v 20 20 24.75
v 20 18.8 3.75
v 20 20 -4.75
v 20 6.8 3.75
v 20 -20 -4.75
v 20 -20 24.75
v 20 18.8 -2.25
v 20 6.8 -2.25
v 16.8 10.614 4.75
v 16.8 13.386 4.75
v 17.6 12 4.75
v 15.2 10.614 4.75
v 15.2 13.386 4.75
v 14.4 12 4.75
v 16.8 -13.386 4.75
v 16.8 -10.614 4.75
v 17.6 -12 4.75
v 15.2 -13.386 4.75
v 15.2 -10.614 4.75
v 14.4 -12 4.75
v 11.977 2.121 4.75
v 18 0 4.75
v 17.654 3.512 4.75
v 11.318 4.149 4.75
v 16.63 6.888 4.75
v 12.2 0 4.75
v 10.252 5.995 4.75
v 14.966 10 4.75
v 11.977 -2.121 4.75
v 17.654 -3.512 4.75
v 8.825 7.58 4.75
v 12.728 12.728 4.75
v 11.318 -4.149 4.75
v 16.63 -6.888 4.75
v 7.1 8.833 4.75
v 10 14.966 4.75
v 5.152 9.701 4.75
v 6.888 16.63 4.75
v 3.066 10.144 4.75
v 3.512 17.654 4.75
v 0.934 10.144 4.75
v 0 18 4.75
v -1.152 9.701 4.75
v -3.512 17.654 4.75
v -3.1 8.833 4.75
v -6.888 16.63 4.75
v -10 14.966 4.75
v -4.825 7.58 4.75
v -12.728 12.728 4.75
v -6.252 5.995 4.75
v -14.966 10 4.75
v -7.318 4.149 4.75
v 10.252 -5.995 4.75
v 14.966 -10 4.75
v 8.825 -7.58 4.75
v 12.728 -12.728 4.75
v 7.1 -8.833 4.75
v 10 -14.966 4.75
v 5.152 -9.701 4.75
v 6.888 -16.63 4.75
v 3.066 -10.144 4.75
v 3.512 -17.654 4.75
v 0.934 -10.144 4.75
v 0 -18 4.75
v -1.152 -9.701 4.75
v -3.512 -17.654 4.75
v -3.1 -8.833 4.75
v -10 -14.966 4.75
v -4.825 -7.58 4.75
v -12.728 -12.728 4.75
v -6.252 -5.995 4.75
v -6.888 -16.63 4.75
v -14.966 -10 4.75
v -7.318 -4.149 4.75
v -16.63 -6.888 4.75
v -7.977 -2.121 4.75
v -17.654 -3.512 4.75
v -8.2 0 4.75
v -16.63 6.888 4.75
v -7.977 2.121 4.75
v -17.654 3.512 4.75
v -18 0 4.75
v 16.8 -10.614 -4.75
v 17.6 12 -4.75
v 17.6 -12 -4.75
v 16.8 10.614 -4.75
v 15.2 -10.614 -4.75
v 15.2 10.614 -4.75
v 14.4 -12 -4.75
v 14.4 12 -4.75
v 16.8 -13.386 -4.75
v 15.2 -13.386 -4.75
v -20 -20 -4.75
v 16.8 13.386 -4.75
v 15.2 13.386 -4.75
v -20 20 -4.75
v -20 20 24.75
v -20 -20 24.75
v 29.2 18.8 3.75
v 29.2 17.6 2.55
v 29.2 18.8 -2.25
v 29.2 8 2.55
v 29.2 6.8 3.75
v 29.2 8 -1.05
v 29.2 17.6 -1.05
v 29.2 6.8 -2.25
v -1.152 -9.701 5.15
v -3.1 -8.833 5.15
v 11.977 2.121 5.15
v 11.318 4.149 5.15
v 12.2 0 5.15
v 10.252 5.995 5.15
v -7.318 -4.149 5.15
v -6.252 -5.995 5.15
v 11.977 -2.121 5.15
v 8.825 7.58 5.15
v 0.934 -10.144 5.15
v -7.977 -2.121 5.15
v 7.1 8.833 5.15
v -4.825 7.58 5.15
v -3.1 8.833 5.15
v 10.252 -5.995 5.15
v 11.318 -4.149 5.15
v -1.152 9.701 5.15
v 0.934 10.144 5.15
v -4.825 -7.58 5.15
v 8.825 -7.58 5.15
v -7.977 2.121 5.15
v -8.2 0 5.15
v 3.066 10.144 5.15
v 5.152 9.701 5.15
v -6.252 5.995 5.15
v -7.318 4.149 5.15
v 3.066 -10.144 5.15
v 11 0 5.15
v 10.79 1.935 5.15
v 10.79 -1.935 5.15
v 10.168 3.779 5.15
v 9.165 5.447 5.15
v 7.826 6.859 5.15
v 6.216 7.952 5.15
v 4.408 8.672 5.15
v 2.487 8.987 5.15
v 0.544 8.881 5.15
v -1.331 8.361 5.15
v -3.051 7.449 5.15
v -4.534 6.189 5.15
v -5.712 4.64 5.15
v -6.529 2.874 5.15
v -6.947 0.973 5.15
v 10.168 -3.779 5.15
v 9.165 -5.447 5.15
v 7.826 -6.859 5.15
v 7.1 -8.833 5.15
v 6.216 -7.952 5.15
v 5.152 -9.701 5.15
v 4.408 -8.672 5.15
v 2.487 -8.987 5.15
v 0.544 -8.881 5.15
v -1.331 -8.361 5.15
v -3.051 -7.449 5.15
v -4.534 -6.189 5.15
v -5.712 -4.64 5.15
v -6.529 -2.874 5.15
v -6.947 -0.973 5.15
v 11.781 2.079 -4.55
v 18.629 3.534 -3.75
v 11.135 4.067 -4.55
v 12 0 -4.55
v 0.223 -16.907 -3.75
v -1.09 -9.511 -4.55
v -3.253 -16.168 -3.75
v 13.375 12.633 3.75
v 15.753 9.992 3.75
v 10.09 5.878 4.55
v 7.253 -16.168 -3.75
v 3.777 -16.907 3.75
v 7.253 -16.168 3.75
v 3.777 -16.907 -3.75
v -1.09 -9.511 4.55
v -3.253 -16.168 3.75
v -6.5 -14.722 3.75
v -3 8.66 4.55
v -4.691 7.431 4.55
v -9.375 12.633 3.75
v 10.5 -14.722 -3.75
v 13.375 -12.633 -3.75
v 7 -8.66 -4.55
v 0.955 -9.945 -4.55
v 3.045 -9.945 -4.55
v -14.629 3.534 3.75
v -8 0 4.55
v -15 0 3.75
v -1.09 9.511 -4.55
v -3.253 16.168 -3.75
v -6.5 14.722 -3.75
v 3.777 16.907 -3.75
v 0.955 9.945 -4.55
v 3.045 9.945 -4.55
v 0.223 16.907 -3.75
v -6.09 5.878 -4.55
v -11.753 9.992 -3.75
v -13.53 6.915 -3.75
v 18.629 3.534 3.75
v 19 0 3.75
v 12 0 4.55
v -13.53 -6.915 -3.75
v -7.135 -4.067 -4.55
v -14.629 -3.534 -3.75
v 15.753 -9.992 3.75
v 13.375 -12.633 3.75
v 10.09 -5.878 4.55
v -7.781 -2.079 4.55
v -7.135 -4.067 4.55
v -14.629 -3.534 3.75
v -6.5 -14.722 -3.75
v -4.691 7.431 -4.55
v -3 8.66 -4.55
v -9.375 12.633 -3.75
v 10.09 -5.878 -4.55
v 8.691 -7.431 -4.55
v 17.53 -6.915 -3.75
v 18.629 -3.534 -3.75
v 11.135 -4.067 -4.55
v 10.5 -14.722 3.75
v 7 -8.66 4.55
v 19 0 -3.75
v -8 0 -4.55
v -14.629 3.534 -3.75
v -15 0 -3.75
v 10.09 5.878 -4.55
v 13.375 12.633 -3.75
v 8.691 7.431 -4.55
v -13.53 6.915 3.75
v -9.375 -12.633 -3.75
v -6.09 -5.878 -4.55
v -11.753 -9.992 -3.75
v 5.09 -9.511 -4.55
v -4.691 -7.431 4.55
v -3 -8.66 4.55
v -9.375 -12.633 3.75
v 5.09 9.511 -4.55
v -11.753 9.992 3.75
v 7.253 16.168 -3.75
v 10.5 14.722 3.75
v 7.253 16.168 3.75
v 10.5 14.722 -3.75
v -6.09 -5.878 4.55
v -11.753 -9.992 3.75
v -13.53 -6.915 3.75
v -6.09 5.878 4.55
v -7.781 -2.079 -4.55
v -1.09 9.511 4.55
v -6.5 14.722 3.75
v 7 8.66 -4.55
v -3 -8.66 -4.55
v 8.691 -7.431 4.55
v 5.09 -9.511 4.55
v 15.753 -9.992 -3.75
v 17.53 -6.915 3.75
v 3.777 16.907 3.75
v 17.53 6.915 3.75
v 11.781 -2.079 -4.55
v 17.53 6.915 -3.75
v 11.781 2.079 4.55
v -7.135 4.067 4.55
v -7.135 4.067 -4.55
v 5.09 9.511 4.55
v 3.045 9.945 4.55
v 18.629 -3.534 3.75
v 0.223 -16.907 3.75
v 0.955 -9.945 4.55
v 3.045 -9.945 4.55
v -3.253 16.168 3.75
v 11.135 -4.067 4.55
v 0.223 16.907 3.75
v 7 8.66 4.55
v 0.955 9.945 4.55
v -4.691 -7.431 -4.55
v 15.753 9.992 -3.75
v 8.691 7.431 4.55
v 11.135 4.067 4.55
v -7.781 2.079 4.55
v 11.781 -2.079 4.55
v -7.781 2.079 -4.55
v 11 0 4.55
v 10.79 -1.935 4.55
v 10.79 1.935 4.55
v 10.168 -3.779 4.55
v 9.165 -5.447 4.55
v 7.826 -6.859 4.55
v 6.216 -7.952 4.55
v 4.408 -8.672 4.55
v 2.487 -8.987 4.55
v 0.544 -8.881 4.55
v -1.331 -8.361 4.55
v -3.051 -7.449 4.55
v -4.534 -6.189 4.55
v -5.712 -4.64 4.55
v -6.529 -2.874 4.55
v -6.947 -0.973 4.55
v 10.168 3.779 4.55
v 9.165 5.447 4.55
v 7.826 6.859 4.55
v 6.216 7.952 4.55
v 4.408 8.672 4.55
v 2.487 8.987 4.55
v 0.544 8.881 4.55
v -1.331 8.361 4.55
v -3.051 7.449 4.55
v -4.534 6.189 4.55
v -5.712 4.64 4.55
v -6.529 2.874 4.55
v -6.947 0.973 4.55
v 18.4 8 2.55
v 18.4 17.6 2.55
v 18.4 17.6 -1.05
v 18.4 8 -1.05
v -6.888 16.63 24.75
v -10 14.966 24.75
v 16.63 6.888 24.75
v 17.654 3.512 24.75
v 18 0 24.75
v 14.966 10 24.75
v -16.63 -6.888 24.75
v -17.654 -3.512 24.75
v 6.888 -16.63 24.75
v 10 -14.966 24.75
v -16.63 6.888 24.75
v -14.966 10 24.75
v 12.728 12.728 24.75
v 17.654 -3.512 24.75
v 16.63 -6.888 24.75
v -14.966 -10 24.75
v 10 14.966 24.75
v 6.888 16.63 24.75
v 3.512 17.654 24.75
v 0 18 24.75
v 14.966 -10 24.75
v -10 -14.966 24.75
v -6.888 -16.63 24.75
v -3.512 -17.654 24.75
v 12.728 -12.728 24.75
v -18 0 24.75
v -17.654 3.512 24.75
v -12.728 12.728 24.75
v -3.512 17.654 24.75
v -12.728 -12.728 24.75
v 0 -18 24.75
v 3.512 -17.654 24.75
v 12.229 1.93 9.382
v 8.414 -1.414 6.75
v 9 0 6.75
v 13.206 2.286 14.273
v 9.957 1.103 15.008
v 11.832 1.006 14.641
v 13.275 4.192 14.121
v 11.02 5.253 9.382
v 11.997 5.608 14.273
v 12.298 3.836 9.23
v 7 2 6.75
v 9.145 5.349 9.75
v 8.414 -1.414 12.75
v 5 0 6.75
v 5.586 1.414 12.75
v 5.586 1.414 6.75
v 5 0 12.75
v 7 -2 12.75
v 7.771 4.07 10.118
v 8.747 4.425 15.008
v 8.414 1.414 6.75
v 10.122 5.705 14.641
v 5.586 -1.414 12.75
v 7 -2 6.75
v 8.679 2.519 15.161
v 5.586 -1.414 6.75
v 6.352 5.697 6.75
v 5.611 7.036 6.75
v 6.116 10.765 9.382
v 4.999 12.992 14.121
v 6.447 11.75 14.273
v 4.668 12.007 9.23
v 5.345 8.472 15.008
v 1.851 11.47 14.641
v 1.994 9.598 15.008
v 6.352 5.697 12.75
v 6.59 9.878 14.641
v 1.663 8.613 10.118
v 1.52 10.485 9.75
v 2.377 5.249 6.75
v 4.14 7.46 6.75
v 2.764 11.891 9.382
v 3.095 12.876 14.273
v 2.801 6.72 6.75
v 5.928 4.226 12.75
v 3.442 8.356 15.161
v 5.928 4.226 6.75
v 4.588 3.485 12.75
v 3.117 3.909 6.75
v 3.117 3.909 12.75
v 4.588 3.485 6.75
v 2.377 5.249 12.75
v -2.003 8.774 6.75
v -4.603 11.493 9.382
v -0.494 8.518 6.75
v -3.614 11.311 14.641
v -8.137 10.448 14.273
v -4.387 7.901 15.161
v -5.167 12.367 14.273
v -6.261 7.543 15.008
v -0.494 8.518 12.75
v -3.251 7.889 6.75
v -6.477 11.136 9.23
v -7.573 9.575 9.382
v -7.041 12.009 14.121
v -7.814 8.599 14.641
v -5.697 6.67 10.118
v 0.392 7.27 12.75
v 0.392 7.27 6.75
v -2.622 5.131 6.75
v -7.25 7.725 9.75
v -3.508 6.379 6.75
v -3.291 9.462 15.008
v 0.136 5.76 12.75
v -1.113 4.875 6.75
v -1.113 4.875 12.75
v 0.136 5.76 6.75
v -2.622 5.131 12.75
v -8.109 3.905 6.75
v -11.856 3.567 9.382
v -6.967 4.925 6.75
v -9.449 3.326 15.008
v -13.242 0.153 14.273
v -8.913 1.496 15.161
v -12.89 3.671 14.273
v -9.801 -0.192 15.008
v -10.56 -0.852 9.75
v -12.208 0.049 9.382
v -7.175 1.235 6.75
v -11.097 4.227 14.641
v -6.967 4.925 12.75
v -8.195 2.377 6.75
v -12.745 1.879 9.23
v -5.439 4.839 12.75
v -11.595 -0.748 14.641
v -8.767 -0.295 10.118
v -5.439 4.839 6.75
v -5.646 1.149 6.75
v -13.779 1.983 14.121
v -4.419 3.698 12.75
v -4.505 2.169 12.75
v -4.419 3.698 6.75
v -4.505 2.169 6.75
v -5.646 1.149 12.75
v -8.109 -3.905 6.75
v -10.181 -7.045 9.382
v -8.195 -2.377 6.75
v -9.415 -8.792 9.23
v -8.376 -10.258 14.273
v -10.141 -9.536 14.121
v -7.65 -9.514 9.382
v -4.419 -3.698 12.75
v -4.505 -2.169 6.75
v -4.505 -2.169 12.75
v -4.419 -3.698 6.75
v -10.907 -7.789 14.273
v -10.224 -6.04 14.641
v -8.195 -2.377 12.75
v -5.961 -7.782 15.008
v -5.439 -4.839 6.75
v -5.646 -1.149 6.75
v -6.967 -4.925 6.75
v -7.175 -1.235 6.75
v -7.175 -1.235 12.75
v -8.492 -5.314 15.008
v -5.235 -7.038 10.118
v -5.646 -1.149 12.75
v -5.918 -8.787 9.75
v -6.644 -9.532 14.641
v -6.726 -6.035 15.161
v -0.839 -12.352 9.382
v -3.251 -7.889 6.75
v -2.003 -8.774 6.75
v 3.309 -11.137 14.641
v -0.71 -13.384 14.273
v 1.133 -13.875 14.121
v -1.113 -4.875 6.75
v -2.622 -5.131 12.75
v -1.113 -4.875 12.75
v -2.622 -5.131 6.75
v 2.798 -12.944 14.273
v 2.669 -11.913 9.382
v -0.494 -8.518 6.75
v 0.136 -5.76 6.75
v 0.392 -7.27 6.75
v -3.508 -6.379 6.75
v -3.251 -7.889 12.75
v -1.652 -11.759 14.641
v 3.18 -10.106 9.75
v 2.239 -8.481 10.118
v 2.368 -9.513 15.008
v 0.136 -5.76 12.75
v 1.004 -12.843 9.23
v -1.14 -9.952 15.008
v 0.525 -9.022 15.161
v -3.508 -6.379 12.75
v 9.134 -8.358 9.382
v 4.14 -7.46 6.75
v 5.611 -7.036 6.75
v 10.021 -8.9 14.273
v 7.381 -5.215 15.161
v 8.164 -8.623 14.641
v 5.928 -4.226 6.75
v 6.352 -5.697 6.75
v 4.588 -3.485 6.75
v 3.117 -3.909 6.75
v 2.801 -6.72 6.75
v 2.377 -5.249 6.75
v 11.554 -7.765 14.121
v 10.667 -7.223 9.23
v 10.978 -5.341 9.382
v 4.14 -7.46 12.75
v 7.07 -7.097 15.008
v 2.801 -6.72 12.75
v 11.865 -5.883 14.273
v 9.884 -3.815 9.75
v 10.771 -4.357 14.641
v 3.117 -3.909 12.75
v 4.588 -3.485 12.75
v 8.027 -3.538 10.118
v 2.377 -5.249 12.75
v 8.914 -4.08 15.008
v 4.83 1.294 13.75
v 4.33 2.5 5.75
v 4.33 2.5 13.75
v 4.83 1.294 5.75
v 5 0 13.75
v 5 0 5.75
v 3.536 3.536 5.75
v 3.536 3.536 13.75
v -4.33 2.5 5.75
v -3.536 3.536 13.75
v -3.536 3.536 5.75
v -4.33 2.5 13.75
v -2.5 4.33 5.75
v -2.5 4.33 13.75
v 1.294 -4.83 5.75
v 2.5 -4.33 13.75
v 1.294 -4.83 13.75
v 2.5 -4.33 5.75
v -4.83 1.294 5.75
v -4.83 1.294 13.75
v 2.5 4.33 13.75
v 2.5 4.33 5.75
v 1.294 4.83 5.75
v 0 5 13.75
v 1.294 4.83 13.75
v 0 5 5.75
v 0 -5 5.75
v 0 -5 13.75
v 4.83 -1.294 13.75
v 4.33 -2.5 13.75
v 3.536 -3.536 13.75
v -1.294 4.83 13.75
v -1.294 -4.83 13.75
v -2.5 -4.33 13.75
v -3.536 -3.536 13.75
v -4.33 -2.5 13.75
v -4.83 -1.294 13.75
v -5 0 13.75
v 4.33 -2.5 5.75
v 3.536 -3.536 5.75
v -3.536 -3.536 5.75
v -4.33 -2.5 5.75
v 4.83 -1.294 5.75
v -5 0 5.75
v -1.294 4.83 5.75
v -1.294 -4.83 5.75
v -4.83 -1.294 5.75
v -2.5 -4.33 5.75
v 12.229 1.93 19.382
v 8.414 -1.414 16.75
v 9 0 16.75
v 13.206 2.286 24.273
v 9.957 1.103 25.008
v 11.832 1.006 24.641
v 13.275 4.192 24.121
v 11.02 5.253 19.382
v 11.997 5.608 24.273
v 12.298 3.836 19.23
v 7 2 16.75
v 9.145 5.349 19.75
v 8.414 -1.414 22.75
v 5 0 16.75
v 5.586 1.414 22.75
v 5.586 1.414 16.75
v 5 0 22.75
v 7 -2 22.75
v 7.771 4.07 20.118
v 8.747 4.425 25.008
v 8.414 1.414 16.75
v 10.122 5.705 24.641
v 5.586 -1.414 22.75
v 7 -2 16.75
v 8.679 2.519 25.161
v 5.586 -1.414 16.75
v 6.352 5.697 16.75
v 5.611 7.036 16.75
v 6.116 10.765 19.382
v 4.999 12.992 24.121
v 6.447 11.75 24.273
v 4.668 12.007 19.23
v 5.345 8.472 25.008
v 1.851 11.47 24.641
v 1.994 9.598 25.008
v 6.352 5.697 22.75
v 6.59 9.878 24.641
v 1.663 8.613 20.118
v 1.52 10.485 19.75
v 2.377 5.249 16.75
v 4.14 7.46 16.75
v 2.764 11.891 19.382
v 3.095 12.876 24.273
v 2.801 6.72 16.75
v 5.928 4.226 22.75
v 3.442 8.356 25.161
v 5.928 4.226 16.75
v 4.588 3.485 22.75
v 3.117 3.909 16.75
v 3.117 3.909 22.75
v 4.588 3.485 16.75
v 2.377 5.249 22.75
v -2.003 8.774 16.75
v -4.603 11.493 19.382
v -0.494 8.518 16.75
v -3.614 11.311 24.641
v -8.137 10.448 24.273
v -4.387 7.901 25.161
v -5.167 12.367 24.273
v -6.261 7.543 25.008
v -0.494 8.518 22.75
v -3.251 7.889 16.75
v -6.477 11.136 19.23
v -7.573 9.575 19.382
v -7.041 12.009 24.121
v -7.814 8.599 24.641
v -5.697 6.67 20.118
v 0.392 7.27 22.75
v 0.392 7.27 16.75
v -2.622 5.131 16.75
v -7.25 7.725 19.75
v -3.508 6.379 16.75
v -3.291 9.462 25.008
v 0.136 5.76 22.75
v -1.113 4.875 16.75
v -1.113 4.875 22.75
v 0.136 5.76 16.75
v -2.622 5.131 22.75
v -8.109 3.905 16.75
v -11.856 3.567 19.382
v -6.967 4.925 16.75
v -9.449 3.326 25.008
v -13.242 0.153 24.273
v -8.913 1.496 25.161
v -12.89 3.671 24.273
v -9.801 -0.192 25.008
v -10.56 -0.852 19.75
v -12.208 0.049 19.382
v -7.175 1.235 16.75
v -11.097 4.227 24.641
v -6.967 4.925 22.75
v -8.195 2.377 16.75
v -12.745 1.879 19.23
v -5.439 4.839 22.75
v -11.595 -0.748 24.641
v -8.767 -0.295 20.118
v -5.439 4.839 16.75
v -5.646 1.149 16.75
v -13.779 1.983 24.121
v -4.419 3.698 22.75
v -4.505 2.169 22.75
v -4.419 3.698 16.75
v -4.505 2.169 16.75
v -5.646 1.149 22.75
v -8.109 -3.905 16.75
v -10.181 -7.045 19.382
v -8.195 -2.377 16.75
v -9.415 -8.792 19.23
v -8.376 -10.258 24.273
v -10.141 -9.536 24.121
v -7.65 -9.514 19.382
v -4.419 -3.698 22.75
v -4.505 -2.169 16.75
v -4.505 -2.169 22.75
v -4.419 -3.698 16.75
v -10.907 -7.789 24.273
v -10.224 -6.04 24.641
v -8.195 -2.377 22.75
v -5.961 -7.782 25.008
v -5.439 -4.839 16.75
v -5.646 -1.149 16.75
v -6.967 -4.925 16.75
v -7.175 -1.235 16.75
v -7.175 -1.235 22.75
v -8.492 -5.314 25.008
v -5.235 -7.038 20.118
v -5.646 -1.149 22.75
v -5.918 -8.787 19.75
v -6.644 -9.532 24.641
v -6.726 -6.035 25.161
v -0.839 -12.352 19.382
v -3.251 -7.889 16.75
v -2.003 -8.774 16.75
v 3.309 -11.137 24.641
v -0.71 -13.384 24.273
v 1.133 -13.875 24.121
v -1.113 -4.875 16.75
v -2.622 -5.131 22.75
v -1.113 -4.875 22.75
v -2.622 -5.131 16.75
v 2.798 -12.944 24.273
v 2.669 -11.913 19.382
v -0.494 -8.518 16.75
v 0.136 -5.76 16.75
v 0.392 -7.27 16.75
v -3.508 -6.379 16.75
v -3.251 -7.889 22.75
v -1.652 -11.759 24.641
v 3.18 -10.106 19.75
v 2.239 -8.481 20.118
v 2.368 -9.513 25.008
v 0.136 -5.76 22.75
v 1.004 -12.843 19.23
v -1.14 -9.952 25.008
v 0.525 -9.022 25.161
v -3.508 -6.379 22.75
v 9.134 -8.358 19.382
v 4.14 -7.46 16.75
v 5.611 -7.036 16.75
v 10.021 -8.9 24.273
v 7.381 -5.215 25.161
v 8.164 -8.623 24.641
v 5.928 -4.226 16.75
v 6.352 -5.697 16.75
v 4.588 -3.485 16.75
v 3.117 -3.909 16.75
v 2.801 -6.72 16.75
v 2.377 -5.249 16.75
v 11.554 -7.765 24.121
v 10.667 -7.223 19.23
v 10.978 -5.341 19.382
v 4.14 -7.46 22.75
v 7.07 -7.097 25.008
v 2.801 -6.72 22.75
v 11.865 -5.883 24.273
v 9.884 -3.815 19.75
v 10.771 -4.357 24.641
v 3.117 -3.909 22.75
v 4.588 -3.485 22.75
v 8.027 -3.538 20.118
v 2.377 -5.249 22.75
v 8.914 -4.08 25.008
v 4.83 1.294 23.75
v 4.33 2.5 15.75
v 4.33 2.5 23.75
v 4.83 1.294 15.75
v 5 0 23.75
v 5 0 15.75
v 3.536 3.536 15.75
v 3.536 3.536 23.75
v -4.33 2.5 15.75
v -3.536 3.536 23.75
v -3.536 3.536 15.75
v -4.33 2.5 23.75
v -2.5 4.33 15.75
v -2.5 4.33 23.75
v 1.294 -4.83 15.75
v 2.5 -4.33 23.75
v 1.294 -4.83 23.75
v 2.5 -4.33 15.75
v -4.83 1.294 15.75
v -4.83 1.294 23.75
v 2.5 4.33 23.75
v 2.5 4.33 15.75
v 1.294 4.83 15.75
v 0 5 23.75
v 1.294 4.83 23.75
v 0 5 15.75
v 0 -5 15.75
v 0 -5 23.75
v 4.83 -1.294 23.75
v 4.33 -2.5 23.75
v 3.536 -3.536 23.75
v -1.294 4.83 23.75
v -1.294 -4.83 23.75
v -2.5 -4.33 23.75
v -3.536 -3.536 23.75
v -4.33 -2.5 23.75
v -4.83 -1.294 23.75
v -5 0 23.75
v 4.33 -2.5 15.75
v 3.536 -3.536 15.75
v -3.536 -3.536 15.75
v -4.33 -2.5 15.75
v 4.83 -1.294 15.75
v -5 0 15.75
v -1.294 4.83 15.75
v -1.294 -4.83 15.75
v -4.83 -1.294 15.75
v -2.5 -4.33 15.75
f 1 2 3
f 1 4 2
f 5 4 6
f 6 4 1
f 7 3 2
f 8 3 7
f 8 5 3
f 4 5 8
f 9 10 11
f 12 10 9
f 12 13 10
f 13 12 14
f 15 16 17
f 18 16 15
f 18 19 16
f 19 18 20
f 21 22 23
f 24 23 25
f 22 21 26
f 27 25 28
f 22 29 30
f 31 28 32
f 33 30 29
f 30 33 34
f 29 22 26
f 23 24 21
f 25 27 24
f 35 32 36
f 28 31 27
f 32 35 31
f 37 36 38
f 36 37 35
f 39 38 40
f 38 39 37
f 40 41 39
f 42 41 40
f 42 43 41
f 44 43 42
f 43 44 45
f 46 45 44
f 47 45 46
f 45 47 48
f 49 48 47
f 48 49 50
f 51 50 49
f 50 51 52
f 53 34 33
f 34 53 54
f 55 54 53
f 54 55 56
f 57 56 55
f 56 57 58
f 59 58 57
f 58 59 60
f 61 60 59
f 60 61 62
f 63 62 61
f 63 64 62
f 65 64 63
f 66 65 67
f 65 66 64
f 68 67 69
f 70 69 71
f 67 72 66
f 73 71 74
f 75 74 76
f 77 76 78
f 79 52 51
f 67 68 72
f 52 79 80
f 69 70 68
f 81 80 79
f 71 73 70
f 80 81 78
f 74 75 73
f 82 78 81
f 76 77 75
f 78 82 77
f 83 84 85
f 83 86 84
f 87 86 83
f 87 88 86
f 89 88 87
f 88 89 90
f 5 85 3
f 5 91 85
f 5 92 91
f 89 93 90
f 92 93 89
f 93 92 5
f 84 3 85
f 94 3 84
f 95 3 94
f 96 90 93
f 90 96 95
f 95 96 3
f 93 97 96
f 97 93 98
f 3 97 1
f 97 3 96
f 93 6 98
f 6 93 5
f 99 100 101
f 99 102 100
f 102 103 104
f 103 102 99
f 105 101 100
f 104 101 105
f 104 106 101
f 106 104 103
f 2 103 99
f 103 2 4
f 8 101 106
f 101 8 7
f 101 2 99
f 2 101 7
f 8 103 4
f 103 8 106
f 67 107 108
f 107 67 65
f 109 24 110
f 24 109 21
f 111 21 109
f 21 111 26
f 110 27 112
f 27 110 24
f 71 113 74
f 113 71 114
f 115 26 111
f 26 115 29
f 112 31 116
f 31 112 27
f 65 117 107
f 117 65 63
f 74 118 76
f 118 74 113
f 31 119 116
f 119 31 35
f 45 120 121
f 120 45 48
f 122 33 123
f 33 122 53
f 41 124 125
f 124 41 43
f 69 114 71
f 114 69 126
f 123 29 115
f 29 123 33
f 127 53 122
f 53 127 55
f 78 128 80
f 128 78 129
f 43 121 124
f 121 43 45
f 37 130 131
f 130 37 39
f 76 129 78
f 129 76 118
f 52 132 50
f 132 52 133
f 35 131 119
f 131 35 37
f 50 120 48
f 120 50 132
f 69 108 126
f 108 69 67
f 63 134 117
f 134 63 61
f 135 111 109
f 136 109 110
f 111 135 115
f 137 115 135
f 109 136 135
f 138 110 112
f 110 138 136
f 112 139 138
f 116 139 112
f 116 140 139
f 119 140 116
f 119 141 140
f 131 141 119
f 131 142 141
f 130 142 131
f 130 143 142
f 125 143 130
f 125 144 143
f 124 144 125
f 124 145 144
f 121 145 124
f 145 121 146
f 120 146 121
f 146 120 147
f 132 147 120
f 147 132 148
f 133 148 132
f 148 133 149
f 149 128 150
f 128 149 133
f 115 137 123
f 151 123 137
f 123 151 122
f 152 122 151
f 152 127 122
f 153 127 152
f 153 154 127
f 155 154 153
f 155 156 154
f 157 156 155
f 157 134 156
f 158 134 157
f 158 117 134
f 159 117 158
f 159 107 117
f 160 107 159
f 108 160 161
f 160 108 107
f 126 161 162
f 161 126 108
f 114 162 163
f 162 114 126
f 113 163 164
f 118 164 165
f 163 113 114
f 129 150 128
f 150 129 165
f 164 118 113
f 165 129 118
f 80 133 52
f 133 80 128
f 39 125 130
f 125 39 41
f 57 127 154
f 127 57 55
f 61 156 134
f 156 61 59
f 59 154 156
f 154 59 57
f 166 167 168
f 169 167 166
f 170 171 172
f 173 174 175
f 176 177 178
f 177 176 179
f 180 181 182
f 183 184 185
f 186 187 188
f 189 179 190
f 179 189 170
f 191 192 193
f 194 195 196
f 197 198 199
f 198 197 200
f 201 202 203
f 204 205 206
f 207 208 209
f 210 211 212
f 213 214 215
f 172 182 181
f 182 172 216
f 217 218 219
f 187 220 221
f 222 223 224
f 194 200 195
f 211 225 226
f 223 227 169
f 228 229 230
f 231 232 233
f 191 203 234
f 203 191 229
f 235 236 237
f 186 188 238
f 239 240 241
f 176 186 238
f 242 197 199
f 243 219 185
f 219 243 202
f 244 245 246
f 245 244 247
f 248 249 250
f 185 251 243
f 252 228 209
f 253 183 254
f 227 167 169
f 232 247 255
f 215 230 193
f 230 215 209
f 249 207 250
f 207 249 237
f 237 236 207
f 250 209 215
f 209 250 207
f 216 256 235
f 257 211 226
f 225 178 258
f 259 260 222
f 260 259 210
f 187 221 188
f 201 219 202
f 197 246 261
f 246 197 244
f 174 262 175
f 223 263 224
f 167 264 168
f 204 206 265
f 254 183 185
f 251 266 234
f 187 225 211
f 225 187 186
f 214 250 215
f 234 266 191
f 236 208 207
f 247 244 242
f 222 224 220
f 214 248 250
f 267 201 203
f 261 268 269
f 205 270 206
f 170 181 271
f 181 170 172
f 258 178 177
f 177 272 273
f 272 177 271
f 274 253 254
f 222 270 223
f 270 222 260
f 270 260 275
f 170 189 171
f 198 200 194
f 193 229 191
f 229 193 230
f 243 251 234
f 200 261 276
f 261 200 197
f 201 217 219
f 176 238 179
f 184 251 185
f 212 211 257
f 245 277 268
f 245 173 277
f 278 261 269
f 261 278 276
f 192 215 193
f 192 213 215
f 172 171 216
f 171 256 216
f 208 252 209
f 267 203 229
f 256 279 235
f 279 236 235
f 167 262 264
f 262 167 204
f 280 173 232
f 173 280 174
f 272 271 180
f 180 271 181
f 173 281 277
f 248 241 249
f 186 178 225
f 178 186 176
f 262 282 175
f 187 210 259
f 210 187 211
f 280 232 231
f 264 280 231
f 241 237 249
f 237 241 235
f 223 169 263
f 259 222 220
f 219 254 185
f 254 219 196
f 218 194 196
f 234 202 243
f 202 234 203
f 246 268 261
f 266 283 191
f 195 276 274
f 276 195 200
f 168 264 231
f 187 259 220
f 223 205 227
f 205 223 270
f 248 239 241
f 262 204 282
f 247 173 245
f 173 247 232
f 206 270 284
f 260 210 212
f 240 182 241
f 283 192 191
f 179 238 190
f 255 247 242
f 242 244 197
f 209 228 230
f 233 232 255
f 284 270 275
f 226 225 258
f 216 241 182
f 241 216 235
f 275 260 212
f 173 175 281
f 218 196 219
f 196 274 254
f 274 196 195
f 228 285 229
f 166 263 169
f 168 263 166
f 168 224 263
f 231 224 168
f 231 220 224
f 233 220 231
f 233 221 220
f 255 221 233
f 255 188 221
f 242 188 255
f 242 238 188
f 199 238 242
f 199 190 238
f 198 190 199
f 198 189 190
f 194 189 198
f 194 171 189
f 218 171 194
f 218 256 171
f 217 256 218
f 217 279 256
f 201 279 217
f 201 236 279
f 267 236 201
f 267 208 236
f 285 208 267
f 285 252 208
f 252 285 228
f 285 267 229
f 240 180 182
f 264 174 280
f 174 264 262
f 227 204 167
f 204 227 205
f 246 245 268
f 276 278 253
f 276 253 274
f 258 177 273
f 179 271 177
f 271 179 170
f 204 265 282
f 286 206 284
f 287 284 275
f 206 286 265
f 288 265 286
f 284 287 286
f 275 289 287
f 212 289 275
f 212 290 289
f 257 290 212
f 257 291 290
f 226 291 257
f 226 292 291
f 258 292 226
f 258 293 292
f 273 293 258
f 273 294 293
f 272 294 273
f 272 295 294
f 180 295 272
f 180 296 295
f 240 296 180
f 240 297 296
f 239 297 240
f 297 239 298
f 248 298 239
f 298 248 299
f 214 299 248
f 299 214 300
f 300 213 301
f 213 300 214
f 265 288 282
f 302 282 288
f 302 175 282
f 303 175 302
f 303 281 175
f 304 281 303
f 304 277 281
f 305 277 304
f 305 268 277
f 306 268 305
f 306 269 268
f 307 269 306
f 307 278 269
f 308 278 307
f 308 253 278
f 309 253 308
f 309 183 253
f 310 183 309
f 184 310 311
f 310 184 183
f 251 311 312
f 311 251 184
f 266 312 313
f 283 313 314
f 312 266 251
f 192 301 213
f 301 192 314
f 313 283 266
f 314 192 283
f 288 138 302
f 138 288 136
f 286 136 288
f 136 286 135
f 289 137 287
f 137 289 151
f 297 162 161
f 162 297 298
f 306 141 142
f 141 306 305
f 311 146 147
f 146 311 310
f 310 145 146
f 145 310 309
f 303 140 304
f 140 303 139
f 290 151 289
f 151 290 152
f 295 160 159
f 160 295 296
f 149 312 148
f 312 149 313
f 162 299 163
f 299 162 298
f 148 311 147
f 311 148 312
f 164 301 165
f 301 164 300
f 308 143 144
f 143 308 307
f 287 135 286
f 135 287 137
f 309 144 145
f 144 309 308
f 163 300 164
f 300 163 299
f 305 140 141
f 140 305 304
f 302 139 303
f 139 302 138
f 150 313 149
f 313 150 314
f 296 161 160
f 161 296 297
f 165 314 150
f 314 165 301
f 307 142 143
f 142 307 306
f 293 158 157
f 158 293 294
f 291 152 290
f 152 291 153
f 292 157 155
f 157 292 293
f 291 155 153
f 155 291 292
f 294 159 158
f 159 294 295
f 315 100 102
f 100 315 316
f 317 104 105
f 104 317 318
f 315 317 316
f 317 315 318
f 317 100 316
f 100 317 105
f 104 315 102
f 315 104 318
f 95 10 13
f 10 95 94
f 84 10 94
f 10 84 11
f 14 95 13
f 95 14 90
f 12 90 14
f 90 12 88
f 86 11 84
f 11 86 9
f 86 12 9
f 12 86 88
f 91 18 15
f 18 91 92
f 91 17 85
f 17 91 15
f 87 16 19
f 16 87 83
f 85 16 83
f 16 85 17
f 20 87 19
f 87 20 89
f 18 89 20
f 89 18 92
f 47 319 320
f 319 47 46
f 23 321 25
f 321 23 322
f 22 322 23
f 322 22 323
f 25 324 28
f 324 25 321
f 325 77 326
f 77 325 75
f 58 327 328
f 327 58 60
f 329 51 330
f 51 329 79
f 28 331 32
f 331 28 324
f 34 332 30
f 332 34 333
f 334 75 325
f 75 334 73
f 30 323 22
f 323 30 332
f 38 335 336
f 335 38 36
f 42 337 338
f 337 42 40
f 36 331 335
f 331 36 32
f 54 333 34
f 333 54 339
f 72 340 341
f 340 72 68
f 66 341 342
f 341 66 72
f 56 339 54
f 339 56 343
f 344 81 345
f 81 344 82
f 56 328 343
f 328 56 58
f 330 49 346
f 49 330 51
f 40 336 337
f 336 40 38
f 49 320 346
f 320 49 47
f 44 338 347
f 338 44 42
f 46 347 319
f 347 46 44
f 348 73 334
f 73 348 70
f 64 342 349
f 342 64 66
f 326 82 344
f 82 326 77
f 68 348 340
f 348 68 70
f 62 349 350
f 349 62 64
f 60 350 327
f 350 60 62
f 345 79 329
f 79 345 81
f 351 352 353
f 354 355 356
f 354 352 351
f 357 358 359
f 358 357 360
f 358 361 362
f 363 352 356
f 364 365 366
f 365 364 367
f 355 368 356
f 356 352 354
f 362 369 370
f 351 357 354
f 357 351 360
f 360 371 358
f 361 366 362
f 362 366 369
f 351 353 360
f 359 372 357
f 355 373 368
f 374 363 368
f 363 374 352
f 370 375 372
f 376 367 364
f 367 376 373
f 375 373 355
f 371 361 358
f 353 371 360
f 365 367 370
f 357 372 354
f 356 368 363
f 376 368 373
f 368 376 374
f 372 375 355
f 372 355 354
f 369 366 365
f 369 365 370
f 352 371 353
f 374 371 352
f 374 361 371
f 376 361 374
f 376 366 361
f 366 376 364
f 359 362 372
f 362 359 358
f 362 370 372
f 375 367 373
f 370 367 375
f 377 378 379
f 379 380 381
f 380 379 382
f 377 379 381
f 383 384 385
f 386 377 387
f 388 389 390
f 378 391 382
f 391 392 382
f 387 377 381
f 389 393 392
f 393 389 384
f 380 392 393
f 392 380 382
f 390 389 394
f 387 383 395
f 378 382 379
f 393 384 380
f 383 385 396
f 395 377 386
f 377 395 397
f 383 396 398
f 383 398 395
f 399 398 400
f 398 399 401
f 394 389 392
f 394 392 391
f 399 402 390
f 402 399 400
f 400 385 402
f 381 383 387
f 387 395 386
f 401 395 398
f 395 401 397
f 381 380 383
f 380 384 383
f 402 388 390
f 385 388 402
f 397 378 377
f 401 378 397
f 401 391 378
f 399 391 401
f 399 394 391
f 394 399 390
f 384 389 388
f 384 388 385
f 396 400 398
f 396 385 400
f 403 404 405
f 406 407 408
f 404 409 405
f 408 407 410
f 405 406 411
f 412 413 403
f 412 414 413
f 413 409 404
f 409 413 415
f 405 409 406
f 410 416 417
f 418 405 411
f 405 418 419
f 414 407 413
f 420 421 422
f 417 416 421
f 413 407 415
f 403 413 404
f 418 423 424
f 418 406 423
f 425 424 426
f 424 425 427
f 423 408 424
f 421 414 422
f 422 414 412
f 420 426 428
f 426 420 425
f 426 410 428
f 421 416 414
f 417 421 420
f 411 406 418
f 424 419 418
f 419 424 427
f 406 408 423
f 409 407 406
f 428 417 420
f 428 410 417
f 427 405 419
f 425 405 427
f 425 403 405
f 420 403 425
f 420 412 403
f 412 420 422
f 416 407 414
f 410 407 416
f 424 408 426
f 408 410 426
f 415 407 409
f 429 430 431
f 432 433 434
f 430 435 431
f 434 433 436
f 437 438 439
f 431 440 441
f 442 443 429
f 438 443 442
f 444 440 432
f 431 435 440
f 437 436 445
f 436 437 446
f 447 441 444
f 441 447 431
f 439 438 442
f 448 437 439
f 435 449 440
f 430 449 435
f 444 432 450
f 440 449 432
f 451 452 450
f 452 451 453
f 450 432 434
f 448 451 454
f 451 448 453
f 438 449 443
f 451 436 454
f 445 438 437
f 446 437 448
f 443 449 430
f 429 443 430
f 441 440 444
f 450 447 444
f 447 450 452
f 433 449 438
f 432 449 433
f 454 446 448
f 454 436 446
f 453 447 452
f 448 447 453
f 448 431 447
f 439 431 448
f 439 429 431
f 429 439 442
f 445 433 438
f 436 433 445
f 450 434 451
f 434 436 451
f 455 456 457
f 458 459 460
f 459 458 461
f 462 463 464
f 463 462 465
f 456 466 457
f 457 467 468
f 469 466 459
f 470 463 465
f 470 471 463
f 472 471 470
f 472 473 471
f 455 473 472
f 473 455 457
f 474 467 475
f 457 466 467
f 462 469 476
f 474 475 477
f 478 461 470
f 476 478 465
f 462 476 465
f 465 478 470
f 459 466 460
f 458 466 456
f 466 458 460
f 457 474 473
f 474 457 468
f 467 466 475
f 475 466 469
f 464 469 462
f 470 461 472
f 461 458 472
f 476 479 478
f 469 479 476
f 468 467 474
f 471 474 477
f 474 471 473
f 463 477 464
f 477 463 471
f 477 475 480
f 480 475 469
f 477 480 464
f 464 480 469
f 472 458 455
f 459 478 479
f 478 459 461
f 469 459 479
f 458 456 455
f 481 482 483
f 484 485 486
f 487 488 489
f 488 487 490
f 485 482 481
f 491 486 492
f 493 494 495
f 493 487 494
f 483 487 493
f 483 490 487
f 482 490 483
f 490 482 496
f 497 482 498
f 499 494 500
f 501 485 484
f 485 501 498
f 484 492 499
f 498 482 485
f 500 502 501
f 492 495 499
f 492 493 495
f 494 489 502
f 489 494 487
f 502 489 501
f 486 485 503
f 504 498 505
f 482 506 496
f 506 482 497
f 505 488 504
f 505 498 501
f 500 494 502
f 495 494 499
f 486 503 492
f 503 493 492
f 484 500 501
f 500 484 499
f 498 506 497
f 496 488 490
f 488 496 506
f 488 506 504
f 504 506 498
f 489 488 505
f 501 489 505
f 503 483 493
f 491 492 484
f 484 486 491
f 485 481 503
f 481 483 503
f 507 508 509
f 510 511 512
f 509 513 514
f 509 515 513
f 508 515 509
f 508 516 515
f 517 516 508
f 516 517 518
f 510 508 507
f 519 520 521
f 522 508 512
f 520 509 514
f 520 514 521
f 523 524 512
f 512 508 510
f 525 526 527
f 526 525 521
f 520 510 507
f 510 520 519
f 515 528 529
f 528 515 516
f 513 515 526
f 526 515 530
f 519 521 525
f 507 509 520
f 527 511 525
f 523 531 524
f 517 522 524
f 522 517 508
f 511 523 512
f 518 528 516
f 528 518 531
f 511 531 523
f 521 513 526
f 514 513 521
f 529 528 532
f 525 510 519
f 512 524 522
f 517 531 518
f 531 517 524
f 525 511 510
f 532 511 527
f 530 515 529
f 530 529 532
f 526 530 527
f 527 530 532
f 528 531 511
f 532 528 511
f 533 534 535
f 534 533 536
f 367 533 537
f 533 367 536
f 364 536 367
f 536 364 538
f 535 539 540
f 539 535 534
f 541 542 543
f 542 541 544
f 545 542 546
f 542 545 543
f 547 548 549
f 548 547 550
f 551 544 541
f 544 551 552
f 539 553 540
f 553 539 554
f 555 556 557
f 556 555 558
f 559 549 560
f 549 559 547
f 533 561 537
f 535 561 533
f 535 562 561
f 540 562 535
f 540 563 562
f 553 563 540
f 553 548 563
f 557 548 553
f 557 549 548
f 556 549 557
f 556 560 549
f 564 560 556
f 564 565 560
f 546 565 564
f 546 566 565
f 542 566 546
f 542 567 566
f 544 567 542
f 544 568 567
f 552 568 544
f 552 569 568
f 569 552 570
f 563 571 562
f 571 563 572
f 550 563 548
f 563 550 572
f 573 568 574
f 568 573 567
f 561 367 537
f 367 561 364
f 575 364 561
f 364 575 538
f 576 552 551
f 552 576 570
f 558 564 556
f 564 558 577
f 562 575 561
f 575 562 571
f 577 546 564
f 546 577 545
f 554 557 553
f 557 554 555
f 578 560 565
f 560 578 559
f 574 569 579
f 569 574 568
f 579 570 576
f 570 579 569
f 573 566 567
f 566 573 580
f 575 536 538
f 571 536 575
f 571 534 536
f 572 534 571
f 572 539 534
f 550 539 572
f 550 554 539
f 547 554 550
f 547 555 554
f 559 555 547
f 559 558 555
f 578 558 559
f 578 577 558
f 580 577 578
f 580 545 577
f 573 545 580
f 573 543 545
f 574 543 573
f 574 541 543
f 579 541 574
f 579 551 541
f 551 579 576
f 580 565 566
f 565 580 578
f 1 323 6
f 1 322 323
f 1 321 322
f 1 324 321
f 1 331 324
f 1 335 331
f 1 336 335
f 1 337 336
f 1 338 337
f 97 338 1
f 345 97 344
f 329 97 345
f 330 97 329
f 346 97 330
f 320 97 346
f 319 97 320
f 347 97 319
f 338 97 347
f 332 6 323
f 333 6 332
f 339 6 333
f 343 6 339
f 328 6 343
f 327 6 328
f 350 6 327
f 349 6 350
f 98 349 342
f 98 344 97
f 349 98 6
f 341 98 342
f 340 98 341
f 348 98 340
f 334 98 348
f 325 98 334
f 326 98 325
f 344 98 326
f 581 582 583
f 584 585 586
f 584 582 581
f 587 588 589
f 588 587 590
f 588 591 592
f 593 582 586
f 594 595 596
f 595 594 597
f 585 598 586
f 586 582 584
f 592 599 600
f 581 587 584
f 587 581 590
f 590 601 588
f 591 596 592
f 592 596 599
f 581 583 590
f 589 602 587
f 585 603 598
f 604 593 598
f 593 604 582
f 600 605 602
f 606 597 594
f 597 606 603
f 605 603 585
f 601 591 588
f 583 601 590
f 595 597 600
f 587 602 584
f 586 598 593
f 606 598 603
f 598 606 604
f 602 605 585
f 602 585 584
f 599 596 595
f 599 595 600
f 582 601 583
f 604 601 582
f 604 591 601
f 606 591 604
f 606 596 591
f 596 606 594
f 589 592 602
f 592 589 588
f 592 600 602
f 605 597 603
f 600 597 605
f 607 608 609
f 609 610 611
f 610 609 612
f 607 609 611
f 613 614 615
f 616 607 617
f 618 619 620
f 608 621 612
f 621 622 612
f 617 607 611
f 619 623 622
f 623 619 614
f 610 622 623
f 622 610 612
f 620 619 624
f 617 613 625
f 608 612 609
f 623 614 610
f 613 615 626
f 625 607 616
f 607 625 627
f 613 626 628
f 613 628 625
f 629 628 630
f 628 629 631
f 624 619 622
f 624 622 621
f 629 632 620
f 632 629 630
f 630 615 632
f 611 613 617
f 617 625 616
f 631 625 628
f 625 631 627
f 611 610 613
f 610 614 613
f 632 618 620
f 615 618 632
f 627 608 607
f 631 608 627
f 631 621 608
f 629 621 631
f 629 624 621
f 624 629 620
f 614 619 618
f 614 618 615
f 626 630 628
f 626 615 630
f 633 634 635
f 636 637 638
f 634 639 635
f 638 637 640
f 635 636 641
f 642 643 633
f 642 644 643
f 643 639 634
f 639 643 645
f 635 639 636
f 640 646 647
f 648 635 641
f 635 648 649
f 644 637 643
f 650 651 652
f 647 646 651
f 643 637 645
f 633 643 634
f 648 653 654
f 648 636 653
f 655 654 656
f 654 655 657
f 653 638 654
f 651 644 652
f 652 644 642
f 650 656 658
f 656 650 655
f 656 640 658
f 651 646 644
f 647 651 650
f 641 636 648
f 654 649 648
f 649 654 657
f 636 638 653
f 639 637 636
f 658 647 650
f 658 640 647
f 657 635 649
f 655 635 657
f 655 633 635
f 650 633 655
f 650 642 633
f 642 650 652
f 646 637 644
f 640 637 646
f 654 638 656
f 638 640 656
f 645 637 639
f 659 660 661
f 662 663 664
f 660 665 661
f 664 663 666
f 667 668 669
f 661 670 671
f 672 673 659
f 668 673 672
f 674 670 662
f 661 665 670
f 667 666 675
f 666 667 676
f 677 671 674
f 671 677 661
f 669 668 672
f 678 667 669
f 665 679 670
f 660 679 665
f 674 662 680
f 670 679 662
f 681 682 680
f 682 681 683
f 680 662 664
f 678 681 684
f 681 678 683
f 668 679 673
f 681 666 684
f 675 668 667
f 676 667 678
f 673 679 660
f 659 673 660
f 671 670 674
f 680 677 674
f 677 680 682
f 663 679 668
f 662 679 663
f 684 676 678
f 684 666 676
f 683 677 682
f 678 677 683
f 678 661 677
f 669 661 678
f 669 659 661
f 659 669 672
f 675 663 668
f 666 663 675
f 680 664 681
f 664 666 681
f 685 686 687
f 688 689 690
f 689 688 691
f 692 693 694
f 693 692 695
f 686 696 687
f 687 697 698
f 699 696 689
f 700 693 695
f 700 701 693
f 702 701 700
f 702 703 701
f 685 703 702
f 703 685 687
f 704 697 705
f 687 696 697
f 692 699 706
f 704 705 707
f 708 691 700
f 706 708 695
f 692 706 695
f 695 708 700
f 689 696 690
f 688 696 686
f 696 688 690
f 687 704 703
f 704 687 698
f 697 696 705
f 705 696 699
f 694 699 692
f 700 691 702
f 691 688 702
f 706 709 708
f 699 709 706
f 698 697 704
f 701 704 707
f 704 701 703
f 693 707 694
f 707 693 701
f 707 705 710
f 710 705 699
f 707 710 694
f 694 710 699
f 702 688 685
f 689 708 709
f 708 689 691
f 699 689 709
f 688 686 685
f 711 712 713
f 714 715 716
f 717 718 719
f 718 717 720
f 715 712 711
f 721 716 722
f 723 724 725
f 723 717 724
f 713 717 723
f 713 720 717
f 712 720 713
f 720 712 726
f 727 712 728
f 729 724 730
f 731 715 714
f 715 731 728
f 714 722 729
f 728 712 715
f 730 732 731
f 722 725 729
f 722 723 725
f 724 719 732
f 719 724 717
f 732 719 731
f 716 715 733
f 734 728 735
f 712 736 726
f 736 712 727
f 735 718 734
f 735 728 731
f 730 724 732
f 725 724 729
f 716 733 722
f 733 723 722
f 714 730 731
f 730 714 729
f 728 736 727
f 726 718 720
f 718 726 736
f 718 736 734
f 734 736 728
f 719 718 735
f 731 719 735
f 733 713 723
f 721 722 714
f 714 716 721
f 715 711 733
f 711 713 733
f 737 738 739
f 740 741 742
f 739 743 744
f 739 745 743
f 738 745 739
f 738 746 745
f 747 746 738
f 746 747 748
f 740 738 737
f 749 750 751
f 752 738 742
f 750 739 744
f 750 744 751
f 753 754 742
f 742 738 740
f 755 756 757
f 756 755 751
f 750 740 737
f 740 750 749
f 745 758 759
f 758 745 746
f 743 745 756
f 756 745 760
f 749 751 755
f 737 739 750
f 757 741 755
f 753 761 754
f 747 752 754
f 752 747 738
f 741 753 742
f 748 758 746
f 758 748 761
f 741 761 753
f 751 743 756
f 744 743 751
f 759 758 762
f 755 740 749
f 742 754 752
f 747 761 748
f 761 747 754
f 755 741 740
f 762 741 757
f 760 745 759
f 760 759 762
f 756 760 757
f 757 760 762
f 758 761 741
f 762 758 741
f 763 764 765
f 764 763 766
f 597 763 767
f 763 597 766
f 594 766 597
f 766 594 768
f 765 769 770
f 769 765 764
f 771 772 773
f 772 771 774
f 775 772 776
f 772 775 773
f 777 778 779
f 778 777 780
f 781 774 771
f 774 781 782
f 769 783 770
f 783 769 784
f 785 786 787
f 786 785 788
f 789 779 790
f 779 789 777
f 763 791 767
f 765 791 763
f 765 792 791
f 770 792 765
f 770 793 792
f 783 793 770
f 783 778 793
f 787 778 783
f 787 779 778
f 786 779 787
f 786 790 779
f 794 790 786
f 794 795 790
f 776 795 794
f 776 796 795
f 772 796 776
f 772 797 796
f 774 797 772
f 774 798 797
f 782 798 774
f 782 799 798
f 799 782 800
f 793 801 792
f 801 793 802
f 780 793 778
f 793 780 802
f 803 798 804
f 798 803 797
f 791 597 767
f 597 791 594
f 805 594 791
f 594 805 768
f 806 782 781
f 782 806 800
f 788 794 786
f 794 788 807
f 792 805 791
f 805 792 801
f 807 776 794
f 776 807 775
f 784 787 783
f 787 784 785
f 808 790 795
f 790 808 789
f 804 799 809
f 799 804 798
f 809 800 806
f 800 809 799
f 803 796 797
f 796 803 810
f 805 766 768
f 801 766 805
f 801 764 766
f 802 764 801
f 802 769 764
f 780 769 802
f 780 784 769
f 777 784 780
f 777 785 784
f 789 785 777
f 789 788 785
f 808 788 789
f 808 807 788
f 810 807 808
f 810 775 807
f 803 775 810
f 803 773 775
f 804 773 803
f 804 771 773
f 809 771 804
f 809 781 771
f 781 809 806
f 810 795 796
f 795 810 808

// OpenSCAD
// Parameters
overall_width_mm = 40; //[20:80:0.5]
overall_length_mm = 40; //[20:80:0.5]
overall_depth_mm = 9.5; //[5:20:0.1]
wall_thickness_mm = 1.2; //[0.8:2.4:0.1]
top_plate_thickness_mm = 1.0; //[0.6:2.0:0.1]
base_plate_thickness_mm = 1.0; //[0.6:2.0:0.1]
clearance_overlap_mm = 0.8; //[0.5:2.0:0.1]
inlet_bore_d_mm = 18; //[10:28:0.5]
inlet_lip_height_mm = 1.2; //[0.6:3.0:0.1]
outlet_width_mm = 12; //[8:20:0.5]
outlet_height_mm = 6; //[4:9:0.5]
outlet_length_mm = 10; //[6:25:0.5]
impeller_outer_d_mm = 26; //[18:34:0.5]
impeller_hub_d_mm = 10; //[6:16:0.5]
impeller_height_mm = 6.5; //[4:8.5:0.1]
blade_count = 25; //[12:40:1]
blade_ring_thickness_mm = 1.2; //[0.8:2.5:0.1]
mount_hole_d_mm = 3.2; //[2.5:4.5:0.1]
mount_hole_edge_offset_mm = 4.0; //[2.5:8.0:0.5]
mount_hole_y_pitch_mm = 24; //[16:32:0.5]
volute_outer_r_mm = 17; //[12:22:0.5]
volute_inner_r_mm = 10; //[7:16:0.5]
volute_center_x_offset_mm = 2.0; //[0:6:0.5]

// Blower - complete geometry
module blower() {
  color([0.15, 0.15, 0.17]) {
    difference() {
      union() {
        // Blower outer block
        translate([0, 0, 0])
          cube([overall_width_mm, overall_length_mm, overall_depth_mm], center=true);
        // Outlet outer duct
        translate([(overall_width_mm/2 + outlet_length_mm/2 - clearance_overlap_mm),
                   (overall_length_mm/2 - outlet_width_mm/2 - wall_thickness_mm),
                   (overall_depth_mm/2 - top_plate_thickness_mm - outlet_height_mm/2)])
          cube([outlet_length_mm, outlet_width_mm, outlet_height_mm], center=true);
        // Inlet lip cylinder
        translate([volute_center_x_offset_mm, 0,
                   (overall_depth_mm/2 + inlet_lip_height_mm/2 - clearance_overlap_mm)])
          cylinder(r=(inlet_bore_d_mm/2 + wall_thickness_mm), h=inlet_lip_height_mm, center=true);
      }
      // Internal cavity
      hull() {
        translate([volute_center_x_offset_mm, 0, (base_plate_thickness_mm - top_plate_thickness_mm)/2])
          cylinder(r=volute_outer_r_mm, h=(overall_depth_mm - top_plate_thickness_mm - base_plate_thickness_mm), center=true);
        translate([volute_center_x_offset_mm, 0, (base_plate_thickness_mm - top_plate_thickness_mm)/2])
          cylinder(r=volute_inner_r_mm, h=(overall_depth_mm - top_plate_thickness_mm - base_plate_thickness_mm + 2*clearance_overlap_mm), center=true);
      }
      // Inlet bore cut
      translate([volute_center_x_offset_mm, 0, (overall_depth_mm/2 - top_plate_thickness_mm/2)])
        cylinder(r=inlet_bore_d_mm/2, h=(top_plate_thickness_mm + inlet_lip_height_mm + 2*clearance_overlap_mm), center=true);
      // Outlet inner cut
      translate([(overall_width_mm/2 + outlet_length_mm/2 - clearance_overlap_mm),
                 (overall_length_mm/2 - outlet_width_mm/2 - wall_thickness_mm),
                 (overall_depth_mm/2 - top_plate_thickness_mm - outlet_height_mm/2)])
        cube([(outlet_length_mm + 2*clearance_overlap_mm),
              (outlet_width_mm - 2*wall_thickness_mm),
              (outlet_height_mm - 2*wall_thickness_mm)], center=true);
      // Mount holes
      translate([(overall_width_mm/2 - mount_hole_edge_offset_mm), (mount_hole_y_pitch_mm/2), 0])
        cylinder(r=mount_hole_d_mm/2, h=(overall_depth_mm + 2*clearance_overlap_mm), center=true);
      translate([(overall_width_mm/2 - mount_hole_edge_offset_mm), (-mount_hole_y_pitch_mm/2), 0])
        cylinder(r=mount_hole_d_mm/2, h=(overall_depth_mm + 2*clearance_overlap_mm), center=true);
    }
  }
}

// Fan - complete geometry
module fan() {
  color([0.2, 0.2, 0.22]) {
    // Frame
    difference() {
      cube([overall_width_mm, overall_length_mm, 10], center=true);
      cylinder(d=overall_width_mm-4, h=12, center=true, $fn=32);
    }
    // Hub
    cylinder(d=impeller_hub_d_mm, h=8, center=true, $fn=24);
    // Blades - 7 curved blades
    for(i=[0:6]) rotate([0,0,i*360/7])
      hull() {
        translate([impeller_hub_d_mm/2+2,0,-3]) cylinder(r=2, h=6, $fn=8);
        translate([impeller_outer_d_mm/2-3,3,0]) rotate([0,12,20]) cylinder(r=2.5, h=5, $fn=8);
      }
  }
}

// Blower Fan - complete geometry
module blower_fan() {
  color([0.2, 0.2, 0.22]) {
    // Frame
    difference() {
      cube([overall_width_mm, overall_length_mm, 10], center=true);
      cylinder(d=overall_width_mm-4, h=12, center=true, $fn=32);
    }
    // Hub
    cylinder(d=impeller_hub_d_mm, h=8, center=true, $fn=24);
    // Blades - 7 curved blades
    for(i=[0:6]) rotate([0,0,i*360/7])
      hull() {
        translate([impeller_hub_d_mm/2+2,0,-3]) cylinder(r=2, h=6, $fn=8);
        translate([impeller_outer_d_mm/2-3,3,0]) rotate([0,12,20]) cylinder(r=2.5, h=5, $fn=8);
      }
  }
}

// Assembly
module assembly() {
  blower();
  translate([0, 0, overall_depth_mm/2 + 5]) fan();
  translate([0, 0, overall_depth_mm/2 + 15]) blower_fan();
}

assembly();
